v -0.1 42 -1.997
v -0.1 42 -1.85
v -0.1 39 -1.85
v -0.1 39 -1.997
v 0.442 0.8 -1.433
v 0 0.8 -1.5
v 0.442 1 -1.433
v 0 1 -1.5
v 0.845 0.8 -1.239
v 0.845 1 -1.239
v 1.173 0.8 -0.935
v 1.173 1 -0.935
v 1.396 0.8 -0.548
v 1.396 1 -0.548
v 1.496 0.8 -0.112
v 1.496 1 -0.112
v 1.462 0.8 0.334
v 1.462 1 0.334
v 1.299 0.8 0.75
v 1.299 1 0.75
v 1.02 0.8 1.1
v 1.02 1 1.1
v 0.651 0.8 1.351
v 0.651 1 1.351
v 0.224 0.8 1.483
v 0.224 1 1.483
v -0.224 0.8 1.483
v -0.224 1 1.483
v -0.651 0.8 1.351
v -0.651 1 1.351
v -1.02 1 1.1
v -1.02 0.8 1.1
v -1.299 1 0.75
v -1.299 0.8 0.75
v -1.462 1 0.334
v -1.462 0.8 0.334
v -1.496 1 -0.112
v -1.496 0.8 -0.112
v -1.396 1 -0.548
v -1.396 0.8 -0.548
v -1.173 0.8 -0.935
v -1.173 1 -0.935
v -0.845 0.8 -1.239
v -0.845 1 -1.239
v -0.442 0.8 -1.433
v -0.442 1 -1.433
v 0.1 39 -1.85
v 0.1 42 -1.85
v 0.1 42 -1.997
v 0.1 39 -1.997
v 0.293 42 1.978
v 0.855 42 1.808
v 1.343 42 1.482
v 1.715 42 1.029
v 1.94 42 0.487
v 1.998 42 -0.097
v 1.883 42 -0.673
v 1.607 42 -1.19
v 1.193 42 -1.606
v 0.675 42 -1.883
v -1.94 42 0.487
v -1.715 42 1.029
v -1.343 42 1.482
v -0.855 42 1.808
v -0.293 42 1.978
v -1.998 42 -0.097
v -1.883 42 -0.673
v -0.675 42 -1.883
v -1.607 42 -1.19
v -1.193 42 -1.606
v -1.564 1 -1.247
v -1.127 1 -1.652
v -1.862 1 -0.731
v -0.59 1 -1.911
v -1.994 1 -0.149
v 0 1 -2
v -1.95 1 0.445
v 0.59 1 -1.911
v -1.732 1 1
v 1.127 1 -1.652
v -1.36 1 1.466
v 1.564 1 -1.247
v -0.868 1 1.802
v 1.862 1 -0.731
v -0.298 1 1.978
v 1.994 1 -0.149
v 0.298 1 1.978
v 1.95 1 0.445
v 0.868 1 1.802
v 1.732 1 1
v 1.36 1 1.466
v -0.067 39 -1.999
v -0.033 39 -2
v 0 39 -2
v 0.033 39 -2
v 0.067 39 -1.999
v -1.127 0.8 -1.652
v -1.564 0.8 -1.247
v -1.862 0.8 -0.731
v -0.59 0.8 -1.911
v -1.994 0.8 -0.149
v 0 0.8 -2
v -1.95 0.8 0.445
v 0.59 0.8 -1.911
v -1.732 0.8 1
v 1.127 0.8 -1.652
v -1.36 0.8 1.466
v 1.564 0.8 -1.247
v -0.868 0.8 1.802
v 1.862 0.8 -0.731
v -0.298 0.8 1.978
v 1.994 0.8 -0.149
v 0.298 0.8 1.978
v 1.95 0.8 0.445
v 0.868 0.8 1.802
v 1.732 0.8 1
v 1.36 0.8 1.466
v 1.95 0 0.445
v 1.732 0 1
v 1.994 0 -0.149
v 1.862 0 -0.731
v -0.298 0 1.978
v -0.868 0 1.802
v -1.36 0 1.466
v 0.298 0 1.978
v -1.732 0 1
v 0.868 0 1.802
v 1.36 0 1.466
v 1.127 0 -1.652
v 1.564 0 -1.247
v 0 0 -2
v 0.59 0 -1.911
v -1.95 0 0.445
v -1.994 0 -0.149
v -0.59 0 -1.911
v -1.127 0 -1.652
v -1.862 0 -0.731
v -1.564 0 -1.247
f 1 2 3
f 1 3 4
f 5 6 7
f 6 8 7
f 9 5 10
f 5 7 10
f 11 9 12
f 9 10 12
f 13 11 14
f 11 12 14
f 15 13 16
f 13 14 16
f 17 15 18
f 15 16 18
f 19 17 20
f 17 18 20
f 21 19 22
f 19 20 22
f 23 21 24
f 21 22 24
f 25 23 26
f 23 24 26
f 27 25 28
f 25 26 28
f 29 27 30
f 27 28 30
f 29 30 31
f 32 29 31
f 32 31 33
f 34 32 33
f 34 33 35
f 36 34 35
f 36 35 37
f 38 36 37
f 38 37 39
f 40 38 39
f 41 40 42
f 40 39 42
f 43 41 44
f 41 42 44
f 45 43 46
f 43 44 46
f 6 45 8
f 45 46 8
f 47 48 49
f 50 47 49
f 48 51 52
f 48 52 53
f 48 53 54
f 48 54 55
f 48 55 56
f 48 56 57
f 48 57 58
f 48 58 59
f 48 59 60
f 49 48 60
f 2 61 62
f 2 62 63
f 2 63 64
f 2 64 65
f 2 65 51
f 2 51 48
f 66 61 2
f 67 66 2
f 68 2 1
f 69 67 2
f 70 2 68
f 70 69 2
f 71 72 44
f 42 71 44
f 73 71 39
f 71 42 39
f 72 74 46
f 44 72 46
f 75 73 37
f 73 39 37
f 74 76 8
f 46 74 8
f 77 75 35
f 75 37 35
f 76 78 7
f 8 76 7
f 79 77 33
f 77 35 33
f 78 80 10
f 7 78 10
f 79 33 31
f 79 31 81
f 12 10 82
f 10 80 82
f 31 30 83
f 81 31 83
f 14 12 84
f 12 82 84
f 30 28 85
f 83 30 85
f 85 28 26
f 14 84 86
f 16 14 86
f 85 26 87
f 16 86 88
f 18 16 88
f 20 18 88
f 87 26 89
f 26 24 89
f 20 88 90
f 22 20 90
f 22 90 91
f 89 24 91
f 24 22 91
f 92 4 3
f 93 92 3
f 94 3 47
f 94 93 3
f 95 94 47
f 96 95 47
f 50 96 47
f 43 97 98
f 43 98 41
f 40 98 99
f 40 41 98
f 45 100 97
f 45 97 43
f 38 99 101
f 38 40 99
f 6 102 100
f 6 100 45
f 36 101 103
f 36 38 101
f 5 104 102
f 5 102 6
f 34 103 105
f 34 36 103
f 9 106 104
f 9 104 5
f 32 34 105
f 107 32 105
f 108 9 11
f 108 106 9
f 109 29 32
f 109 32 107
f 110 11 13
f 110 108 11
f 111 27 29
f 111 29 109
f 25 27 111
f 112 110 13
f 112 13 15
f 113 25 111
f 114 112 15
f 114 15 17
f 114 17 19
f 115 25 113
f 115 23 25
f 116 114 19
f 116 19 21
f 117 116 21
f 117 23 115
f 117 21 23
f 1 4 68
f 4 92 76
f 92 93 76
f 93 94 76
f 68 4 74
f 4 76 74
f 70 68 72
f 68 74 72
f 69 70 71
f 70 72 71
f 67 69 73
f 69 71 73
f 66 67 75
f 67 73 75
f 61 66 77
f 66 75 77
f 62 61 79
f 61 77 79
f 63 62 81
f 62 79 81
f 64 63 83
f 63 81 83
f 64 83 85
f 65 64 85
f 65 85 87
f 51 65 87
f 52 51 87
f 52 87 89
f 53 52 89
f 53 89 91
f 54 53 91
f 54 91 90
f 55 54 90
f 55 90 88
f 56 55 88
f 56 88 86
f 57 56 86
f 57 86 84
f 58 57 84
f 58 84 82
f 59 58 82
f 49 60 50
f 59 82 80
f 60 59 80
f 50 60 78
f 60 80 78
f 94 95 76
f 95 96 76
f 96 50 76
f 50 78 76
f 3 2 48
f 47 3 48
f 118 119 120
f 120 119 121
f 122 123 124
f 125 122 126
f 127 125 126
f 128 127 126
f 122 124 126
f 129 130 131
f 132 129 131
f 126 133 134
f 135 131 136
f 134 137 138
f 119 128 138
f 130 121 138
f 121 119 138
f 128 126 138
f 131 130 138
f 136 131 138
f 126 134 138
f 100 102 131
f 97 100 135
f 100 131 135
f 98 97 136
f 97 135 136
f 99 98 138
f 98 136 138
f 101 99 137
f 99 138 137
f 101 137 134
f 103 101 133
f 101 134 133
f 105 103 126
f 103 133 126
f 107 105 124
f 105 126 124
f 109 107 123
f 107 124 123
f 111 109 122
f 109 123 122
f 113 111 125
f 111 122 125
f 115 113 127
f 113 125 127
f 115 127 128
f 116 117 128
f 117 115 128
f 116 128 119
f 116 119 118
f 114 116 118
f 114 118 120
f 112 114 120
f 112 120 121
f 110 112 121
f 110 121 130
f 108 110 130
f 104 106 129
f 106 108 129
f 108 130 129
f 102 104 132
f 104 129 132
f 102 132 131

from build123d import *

# Parameters (mm, degrees)
SKETCH1_R           = 2
BOSS_EXTRUDE1_DEPTH = 42
SKETCH2_W           = 0.5
SKETCH2_H           = 0.2
SKETCH3_W           = 0.2
SKETCH3_H           = 0.15
CUT_EXTRUDE1_DEPTH  = 3


with BuildPart() as part:
    # Sketch1 → Boss-Extrude1 (new body)
    with BuildSketch(Plane(origin=(0, 0, 0), x_dir=(1, 0, 0), z_dir=(0, 1, 0))):
        with Locations(Location((0, 0, 0), (0, 0, 90))):
            Circle(SKETCH1_R)
    extrude(amount=BOSS_EXTRUDE1_DEPTH)

    # Sketch2 → Cut-Revolve1 (revolve, cut)
    with BuildSketch(Plane(origin=(0, 0, 0), x_dir=(0, 0, -1), z_dir=(1, 0, 0))):
        with Locations((1.75, 0.9)):
            Rectangle(SKETCH2_W, SKETCH2_H)
    revolve(axis=Axis((0, 3.062104398, 0), (0, -1, 0)), mode=Mode.SUBTRACT)

    # Sketch3 → Cut-Extrude1 (cut)
    with BuildSketch(Plane(origin=(0, 42, 0), x_dir=(1, 0, 0), z_dir=(0, 1, 0))):
        with Locations((0, 1.925)):
            Rectangle(SKETCH3_W, SKETCH3_H)
    extrude(amount=-CUT_EXTRUDE1_DEPTH, mode=Mode.SUBTRACT)


solid = part.part
